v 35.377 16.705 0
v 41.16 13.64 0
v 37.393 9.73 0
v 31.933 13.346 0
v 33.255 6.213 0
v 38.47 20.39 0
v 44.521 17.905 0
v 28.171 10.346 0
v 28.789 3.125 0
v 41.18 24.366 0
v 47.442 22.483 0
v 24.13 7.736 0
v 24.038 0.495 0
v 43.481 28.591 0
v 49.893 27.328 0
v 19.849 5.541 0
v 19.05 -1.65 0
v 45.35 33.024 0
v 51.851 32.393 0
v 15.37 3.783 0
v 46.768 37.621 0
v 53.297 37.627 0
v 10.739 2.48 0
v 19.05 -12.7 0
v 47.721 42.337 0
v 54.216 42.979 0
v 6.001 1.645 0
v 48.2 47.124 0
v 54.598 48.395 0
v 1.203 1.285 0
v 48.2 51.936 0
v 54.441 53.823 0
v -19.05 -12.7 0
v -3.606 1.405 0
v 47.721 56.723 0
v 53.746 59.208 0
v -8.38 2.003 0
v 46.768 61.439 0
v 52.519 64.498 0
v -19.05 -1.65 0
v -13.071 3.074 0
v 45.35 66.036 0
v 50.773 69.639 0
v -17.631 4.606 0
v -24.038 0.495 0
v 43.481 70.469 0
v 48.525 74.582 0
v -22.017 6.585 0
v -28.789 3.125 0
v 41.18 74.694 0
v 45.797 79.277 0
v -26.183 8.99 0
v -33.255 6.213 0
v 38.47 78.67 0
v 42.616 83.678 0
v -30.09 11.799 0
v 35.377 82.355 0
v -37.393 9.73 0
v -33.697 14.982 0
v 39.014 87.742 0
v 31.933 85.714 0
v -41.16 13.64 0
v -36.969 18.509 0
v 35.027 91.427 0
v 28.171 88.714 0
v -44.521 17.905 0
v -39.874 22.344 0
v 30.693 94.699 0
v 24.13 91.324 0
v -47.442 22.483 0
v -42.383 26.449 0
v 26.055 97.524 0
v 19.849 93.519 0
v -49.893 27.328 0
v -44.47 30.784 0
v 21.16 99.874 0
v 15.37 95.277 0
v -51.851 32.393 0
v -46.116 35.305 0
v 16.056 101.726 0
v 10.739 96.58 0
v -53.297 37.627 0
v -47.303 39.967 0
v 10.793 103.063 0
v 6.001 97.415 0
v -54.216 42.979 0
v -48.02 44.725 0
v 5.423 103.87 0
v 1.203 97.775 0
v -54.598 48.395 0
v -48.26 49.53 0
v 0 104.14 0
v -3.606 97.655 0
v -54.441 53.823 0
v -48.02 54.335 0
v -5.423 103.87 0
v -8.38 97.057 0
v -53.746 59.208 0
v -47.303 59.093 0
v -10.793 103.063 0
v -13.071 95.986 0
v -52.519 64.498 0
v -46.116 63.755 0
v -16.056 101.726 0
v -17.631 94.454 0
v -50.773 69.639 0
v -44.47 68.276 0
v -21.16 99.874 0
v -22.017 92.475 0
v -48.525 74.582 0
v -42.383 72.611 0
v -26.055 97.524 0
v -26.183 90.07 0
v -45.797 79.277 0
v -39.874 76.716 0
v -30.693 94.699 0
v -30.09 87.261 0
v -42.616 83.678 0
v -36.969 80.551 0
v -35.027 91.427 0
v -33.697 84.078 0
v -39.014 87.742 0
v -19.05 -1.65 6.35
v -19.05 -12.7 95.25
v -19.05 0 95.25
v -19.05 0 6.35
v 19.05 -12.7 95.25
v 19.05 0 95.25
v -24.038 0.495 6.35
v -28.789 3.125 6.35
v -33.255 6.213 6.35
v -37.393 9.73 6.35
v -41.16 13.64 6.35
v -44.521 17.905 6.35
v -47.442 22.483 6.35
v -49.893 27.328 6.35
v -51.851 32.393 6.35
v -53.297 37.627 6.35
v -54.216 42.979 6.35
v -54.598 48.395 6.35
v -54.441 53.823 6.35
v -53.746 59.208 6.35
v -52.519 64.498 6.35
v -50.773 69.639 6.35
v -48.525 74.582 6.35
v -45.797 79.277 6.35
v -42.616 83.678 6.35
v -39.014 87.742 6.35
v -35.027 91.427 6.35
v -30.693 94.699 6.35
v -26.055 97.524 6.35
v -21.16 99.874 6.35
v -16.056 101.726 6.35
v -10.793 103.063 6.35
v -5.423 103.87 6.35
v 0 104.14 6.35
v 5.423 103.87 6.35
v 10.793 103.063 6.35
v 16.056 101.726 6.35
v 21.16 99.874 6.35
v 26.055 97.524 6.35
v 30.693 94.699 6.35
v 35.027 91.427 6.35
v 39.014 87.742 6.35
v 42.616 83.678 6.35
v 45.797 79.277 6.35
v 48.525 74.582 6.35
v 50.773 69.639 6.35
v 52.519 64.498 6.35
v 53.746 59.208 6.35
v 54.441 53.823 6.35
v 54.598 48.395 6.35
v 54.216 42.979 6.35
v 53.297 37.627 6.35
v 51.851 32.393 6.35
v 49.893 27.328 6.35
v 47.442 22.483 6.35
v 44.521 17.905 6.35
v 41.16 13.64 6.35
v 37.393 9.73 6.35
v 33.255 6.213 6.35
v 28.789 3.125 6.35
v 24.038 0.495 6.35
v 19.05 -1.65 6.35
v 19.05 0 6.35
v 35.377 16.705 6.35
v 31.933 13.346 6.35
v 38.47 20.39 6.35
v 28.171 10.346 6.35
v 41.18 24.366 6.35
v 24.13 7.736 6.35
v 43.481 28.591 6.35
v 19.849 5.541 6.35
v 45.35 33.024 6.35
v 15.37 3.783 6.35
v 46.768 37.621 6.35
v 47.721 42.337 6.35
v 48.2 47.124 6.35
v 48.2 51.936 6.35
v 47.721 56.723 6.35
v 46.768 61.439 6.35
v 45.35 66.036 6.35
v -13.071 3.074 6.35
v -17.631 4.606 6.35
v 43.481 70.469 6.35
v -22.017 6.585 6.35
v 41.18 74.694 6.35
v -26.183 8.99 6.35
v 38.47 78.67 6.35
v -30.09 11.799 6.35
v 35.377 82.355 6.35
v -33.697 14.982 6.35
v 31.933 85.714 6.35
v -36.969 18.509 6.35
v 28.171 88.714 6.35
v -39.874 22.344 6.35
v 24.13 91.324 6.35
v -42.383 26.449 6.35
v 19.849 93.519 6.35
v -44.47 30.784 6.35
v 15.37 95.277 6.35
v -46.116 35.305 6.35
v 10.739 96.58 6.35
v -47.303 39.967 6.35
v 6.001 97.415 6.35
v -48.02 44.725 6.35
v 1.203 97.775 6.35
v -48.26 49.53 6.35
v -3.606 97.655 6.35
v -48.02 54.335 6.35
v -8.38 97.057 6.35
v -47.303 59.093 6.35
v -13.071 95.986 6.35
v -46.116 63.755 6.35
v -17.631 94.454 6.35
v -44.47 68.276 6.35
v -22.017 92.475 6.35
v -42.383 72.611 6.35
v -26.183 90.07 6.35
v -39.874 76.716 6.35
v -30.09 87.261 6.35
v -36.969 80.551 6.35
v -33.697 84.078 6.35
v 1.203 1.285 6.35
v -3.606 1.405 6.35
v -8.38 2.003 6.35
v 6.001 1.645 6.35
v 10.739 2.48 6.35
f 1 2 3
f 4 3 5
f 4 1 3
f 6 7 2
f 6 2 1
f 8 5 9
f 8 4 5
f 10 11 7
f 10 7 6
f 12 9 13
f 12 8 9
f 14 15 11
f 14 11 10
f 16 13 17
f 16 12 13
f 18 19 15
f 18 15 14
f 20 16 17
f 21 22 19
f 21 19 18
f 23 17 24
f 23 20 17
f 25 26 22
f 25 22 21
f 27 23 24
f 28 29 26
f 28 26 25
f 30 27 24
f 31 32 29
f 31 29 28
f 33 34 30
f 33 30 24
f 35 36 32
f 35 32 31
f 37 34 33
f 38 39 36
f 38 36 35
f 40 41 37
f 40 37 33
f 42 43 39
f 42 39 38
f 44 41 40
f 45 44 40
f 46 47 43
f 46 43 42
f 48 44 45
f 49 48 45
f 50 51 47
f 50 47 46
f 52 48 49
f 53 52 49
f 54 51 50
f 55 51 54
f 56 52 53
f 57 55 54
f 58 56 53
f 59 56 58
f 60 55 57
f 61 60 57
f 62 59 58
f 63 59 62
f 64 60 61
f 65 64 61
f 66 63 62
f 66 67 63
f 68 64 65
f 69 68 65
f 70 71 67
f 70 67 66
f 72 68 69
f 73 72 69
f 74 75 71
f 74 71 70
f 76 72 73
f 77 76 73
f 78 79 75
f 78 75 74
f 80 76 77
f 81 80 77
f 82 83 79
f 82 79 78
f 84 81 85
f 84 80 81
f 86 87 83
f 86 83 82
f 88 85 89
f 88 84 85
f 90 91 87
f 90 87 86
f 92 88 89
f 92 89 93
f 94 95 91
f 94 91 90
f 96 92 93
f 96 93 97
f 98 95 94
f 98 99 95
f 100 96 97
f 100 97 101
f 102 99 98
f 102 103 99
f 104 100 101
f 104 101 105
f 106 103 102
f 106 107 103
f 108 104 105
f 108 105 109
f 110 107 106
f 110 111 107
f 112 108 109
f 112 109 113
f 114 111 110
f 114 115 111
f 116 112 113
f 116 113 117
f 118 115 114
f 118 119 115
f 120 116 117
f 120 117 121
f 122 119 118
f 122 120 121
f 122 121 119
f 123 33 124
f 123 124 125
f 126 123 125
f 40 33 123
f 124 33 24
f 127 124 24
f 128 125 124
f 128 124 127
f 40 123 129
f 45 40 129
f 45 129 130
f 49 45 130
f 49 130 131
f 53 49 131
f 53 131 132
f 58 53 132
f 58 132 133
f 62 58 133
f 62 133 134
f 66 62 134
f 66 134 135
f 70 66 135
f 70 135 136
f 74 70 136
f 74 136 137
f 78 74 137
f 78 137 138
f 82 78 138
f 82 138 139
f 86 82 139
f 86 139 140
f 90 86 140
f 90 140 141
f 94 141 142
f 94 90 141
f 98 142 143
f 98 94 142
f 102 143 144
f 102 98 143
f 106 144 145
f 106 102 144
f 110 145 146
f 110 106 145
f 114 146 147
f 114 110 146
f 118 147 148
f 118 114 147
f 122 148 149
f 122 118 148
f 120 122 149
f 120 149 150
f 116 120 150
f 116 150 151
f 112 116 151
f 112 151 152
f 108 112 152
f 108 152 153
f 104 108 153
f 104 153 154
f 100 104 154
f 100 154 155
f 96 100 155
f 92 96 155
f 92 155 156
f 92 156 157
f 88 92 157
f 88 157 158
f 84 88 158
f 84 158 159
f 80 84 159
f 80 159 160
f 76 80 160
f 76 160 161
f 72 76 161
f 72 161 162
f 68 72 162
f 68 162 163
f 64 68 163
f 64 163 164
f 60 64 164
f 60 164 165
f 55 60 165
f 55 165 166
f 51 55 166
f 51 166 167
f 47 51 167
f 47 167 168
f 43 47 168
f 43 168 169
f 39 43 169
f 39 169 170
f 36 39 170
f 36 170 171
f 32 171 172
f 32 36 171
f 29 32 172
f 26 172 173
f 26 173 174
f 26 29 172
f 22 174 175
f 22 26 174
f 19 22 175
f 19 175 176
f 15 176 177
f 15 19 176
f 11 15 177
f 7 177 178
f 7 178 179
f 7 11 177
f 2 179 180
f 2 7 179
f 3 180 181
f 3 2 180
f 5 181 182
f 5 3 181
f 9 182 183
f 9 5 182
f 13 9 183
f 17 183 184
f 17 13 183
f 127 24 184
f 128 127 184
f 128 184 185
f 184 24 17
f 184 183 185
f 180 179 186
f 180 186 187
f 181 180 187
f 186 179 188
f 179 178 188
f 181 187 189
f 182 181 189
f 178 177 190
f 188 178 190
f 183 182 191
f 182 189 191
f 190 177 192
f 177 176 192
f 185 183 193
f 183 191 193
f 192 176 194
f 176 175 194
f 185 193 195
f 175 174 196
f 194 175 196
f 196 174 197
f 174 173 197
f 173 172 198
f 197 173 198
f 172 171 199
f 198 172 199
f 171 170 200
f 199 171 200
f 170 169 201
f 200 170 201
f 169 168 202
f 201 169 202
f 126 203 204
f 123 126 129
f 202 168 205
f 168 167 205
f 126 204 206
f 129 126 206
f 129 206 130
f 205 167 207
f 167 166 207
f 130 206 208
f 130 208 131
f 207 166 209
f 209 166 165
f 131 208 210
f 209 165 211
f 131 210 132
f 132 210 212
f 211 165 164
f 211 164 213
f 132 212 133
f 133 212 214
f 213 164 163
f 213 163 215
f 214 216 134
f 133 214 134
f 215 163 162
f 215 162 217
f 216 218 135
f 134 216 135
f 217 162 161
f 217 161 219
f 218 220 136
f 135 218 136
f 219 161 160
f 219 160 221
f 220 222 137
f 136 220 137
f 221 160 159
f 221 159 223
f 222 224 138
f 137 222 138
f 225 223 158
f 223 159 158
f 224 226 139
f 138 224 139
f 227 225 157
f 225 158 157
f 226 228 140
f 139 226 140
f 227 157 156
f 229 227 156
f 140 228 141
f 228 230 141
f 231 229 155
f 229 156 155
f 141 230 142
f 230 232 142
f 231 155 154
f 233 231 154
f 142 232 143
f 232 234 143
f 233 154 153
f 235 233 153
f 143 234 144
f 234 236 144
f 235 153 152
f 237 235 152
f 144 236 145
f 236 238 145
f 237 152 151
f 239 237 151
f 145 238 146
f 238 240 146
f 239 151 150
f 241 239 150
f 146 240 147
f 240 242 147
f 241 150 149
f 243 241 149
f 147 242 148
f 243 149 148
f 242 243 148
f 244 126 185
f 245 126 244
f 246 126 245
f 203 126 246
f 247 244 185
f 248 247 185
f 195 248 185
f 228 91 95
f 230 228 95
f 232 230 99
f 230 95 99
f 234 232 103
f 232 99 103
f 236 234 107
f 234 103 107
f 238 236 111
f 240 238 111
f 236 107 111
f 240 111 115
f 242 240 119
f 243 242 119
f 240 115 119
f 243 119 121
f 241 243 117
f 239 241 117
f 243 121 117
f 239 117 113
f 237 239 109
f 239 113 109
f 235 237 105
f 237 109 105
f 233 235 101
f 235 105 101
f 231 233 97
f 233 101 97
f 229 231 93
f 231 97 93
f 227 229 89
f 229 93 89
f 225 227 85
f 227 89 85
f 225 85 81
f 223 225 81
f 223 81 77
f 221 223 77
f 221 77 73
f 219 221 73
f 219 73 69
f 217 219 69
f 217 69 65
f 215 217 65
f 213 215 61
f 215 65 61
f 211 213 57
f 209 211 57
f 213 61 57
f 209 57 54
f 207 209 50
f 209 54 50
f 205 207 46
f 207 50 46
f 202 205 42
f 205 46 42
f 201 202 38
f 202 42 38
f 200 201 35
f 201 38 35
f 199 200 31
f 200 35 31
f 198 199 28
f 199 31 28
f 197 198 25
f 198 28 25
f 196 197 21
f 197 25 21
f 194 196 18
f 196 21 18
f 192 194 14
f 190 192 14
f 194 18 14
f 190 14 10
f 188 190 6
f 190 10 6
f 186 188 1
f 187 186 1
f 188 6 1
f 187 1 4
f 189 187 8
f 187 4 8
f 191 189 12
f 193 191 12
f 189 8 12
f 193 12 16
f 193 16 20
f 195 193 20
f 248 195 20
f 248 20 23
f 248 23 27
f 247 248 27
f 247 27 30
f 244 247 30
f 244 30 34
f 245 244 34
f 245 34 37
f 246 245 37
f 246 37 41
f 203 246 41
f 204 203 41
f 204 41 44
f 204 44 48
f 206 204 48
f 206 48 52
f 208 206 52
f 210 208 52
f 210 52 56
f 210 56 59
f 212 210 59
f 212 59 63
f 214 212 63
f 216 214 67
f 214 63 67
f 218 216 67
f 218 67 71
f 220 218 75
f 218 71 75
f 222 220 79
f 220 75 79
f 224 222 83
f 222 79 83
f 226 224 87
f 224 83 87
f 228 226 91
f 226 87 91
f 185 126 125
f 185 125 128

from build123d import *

# Parameters (mm, degrees)
SKETCH1_W           = 38.1
SKETCH1_H           = 12.7
BOSS_EXTRUDE1_DEPTH = 95.25
SKETCH2_R           = 54.61
SKETCH2_R_2         = 48.26
BOSS_EXTRUDE2_DEPTH = 6.35


with BuildPart() as part:
    # Sketch1 → Boss-Extrude1 (new body)
    with BuildSketch(Plane.XY):
        with Locations((0, -6.35)):
            Rectangle(SKETCH1_W, SKETCH1_H)
    extrude(amount=BOSS_EXTRUDE1_DEPTH)

    # Sketch2 → Boss-Extrude2 (add)
    with BuildSketch(Plane(origin=(0, 0, 0), x_dir=(-1, 0, 0), z_dir=(0, 0, -1))):
        with Locations((0, 49.53)):
            Circle(SKETCH2_R)
        with Locations((0, 49.53)):
            Circle(SKETCH2_R_2, mode=Mode.SUBTRACT)
    extrude(amount=-BOSS_EXTRUDE2_DEPTH)


solid = part.part
